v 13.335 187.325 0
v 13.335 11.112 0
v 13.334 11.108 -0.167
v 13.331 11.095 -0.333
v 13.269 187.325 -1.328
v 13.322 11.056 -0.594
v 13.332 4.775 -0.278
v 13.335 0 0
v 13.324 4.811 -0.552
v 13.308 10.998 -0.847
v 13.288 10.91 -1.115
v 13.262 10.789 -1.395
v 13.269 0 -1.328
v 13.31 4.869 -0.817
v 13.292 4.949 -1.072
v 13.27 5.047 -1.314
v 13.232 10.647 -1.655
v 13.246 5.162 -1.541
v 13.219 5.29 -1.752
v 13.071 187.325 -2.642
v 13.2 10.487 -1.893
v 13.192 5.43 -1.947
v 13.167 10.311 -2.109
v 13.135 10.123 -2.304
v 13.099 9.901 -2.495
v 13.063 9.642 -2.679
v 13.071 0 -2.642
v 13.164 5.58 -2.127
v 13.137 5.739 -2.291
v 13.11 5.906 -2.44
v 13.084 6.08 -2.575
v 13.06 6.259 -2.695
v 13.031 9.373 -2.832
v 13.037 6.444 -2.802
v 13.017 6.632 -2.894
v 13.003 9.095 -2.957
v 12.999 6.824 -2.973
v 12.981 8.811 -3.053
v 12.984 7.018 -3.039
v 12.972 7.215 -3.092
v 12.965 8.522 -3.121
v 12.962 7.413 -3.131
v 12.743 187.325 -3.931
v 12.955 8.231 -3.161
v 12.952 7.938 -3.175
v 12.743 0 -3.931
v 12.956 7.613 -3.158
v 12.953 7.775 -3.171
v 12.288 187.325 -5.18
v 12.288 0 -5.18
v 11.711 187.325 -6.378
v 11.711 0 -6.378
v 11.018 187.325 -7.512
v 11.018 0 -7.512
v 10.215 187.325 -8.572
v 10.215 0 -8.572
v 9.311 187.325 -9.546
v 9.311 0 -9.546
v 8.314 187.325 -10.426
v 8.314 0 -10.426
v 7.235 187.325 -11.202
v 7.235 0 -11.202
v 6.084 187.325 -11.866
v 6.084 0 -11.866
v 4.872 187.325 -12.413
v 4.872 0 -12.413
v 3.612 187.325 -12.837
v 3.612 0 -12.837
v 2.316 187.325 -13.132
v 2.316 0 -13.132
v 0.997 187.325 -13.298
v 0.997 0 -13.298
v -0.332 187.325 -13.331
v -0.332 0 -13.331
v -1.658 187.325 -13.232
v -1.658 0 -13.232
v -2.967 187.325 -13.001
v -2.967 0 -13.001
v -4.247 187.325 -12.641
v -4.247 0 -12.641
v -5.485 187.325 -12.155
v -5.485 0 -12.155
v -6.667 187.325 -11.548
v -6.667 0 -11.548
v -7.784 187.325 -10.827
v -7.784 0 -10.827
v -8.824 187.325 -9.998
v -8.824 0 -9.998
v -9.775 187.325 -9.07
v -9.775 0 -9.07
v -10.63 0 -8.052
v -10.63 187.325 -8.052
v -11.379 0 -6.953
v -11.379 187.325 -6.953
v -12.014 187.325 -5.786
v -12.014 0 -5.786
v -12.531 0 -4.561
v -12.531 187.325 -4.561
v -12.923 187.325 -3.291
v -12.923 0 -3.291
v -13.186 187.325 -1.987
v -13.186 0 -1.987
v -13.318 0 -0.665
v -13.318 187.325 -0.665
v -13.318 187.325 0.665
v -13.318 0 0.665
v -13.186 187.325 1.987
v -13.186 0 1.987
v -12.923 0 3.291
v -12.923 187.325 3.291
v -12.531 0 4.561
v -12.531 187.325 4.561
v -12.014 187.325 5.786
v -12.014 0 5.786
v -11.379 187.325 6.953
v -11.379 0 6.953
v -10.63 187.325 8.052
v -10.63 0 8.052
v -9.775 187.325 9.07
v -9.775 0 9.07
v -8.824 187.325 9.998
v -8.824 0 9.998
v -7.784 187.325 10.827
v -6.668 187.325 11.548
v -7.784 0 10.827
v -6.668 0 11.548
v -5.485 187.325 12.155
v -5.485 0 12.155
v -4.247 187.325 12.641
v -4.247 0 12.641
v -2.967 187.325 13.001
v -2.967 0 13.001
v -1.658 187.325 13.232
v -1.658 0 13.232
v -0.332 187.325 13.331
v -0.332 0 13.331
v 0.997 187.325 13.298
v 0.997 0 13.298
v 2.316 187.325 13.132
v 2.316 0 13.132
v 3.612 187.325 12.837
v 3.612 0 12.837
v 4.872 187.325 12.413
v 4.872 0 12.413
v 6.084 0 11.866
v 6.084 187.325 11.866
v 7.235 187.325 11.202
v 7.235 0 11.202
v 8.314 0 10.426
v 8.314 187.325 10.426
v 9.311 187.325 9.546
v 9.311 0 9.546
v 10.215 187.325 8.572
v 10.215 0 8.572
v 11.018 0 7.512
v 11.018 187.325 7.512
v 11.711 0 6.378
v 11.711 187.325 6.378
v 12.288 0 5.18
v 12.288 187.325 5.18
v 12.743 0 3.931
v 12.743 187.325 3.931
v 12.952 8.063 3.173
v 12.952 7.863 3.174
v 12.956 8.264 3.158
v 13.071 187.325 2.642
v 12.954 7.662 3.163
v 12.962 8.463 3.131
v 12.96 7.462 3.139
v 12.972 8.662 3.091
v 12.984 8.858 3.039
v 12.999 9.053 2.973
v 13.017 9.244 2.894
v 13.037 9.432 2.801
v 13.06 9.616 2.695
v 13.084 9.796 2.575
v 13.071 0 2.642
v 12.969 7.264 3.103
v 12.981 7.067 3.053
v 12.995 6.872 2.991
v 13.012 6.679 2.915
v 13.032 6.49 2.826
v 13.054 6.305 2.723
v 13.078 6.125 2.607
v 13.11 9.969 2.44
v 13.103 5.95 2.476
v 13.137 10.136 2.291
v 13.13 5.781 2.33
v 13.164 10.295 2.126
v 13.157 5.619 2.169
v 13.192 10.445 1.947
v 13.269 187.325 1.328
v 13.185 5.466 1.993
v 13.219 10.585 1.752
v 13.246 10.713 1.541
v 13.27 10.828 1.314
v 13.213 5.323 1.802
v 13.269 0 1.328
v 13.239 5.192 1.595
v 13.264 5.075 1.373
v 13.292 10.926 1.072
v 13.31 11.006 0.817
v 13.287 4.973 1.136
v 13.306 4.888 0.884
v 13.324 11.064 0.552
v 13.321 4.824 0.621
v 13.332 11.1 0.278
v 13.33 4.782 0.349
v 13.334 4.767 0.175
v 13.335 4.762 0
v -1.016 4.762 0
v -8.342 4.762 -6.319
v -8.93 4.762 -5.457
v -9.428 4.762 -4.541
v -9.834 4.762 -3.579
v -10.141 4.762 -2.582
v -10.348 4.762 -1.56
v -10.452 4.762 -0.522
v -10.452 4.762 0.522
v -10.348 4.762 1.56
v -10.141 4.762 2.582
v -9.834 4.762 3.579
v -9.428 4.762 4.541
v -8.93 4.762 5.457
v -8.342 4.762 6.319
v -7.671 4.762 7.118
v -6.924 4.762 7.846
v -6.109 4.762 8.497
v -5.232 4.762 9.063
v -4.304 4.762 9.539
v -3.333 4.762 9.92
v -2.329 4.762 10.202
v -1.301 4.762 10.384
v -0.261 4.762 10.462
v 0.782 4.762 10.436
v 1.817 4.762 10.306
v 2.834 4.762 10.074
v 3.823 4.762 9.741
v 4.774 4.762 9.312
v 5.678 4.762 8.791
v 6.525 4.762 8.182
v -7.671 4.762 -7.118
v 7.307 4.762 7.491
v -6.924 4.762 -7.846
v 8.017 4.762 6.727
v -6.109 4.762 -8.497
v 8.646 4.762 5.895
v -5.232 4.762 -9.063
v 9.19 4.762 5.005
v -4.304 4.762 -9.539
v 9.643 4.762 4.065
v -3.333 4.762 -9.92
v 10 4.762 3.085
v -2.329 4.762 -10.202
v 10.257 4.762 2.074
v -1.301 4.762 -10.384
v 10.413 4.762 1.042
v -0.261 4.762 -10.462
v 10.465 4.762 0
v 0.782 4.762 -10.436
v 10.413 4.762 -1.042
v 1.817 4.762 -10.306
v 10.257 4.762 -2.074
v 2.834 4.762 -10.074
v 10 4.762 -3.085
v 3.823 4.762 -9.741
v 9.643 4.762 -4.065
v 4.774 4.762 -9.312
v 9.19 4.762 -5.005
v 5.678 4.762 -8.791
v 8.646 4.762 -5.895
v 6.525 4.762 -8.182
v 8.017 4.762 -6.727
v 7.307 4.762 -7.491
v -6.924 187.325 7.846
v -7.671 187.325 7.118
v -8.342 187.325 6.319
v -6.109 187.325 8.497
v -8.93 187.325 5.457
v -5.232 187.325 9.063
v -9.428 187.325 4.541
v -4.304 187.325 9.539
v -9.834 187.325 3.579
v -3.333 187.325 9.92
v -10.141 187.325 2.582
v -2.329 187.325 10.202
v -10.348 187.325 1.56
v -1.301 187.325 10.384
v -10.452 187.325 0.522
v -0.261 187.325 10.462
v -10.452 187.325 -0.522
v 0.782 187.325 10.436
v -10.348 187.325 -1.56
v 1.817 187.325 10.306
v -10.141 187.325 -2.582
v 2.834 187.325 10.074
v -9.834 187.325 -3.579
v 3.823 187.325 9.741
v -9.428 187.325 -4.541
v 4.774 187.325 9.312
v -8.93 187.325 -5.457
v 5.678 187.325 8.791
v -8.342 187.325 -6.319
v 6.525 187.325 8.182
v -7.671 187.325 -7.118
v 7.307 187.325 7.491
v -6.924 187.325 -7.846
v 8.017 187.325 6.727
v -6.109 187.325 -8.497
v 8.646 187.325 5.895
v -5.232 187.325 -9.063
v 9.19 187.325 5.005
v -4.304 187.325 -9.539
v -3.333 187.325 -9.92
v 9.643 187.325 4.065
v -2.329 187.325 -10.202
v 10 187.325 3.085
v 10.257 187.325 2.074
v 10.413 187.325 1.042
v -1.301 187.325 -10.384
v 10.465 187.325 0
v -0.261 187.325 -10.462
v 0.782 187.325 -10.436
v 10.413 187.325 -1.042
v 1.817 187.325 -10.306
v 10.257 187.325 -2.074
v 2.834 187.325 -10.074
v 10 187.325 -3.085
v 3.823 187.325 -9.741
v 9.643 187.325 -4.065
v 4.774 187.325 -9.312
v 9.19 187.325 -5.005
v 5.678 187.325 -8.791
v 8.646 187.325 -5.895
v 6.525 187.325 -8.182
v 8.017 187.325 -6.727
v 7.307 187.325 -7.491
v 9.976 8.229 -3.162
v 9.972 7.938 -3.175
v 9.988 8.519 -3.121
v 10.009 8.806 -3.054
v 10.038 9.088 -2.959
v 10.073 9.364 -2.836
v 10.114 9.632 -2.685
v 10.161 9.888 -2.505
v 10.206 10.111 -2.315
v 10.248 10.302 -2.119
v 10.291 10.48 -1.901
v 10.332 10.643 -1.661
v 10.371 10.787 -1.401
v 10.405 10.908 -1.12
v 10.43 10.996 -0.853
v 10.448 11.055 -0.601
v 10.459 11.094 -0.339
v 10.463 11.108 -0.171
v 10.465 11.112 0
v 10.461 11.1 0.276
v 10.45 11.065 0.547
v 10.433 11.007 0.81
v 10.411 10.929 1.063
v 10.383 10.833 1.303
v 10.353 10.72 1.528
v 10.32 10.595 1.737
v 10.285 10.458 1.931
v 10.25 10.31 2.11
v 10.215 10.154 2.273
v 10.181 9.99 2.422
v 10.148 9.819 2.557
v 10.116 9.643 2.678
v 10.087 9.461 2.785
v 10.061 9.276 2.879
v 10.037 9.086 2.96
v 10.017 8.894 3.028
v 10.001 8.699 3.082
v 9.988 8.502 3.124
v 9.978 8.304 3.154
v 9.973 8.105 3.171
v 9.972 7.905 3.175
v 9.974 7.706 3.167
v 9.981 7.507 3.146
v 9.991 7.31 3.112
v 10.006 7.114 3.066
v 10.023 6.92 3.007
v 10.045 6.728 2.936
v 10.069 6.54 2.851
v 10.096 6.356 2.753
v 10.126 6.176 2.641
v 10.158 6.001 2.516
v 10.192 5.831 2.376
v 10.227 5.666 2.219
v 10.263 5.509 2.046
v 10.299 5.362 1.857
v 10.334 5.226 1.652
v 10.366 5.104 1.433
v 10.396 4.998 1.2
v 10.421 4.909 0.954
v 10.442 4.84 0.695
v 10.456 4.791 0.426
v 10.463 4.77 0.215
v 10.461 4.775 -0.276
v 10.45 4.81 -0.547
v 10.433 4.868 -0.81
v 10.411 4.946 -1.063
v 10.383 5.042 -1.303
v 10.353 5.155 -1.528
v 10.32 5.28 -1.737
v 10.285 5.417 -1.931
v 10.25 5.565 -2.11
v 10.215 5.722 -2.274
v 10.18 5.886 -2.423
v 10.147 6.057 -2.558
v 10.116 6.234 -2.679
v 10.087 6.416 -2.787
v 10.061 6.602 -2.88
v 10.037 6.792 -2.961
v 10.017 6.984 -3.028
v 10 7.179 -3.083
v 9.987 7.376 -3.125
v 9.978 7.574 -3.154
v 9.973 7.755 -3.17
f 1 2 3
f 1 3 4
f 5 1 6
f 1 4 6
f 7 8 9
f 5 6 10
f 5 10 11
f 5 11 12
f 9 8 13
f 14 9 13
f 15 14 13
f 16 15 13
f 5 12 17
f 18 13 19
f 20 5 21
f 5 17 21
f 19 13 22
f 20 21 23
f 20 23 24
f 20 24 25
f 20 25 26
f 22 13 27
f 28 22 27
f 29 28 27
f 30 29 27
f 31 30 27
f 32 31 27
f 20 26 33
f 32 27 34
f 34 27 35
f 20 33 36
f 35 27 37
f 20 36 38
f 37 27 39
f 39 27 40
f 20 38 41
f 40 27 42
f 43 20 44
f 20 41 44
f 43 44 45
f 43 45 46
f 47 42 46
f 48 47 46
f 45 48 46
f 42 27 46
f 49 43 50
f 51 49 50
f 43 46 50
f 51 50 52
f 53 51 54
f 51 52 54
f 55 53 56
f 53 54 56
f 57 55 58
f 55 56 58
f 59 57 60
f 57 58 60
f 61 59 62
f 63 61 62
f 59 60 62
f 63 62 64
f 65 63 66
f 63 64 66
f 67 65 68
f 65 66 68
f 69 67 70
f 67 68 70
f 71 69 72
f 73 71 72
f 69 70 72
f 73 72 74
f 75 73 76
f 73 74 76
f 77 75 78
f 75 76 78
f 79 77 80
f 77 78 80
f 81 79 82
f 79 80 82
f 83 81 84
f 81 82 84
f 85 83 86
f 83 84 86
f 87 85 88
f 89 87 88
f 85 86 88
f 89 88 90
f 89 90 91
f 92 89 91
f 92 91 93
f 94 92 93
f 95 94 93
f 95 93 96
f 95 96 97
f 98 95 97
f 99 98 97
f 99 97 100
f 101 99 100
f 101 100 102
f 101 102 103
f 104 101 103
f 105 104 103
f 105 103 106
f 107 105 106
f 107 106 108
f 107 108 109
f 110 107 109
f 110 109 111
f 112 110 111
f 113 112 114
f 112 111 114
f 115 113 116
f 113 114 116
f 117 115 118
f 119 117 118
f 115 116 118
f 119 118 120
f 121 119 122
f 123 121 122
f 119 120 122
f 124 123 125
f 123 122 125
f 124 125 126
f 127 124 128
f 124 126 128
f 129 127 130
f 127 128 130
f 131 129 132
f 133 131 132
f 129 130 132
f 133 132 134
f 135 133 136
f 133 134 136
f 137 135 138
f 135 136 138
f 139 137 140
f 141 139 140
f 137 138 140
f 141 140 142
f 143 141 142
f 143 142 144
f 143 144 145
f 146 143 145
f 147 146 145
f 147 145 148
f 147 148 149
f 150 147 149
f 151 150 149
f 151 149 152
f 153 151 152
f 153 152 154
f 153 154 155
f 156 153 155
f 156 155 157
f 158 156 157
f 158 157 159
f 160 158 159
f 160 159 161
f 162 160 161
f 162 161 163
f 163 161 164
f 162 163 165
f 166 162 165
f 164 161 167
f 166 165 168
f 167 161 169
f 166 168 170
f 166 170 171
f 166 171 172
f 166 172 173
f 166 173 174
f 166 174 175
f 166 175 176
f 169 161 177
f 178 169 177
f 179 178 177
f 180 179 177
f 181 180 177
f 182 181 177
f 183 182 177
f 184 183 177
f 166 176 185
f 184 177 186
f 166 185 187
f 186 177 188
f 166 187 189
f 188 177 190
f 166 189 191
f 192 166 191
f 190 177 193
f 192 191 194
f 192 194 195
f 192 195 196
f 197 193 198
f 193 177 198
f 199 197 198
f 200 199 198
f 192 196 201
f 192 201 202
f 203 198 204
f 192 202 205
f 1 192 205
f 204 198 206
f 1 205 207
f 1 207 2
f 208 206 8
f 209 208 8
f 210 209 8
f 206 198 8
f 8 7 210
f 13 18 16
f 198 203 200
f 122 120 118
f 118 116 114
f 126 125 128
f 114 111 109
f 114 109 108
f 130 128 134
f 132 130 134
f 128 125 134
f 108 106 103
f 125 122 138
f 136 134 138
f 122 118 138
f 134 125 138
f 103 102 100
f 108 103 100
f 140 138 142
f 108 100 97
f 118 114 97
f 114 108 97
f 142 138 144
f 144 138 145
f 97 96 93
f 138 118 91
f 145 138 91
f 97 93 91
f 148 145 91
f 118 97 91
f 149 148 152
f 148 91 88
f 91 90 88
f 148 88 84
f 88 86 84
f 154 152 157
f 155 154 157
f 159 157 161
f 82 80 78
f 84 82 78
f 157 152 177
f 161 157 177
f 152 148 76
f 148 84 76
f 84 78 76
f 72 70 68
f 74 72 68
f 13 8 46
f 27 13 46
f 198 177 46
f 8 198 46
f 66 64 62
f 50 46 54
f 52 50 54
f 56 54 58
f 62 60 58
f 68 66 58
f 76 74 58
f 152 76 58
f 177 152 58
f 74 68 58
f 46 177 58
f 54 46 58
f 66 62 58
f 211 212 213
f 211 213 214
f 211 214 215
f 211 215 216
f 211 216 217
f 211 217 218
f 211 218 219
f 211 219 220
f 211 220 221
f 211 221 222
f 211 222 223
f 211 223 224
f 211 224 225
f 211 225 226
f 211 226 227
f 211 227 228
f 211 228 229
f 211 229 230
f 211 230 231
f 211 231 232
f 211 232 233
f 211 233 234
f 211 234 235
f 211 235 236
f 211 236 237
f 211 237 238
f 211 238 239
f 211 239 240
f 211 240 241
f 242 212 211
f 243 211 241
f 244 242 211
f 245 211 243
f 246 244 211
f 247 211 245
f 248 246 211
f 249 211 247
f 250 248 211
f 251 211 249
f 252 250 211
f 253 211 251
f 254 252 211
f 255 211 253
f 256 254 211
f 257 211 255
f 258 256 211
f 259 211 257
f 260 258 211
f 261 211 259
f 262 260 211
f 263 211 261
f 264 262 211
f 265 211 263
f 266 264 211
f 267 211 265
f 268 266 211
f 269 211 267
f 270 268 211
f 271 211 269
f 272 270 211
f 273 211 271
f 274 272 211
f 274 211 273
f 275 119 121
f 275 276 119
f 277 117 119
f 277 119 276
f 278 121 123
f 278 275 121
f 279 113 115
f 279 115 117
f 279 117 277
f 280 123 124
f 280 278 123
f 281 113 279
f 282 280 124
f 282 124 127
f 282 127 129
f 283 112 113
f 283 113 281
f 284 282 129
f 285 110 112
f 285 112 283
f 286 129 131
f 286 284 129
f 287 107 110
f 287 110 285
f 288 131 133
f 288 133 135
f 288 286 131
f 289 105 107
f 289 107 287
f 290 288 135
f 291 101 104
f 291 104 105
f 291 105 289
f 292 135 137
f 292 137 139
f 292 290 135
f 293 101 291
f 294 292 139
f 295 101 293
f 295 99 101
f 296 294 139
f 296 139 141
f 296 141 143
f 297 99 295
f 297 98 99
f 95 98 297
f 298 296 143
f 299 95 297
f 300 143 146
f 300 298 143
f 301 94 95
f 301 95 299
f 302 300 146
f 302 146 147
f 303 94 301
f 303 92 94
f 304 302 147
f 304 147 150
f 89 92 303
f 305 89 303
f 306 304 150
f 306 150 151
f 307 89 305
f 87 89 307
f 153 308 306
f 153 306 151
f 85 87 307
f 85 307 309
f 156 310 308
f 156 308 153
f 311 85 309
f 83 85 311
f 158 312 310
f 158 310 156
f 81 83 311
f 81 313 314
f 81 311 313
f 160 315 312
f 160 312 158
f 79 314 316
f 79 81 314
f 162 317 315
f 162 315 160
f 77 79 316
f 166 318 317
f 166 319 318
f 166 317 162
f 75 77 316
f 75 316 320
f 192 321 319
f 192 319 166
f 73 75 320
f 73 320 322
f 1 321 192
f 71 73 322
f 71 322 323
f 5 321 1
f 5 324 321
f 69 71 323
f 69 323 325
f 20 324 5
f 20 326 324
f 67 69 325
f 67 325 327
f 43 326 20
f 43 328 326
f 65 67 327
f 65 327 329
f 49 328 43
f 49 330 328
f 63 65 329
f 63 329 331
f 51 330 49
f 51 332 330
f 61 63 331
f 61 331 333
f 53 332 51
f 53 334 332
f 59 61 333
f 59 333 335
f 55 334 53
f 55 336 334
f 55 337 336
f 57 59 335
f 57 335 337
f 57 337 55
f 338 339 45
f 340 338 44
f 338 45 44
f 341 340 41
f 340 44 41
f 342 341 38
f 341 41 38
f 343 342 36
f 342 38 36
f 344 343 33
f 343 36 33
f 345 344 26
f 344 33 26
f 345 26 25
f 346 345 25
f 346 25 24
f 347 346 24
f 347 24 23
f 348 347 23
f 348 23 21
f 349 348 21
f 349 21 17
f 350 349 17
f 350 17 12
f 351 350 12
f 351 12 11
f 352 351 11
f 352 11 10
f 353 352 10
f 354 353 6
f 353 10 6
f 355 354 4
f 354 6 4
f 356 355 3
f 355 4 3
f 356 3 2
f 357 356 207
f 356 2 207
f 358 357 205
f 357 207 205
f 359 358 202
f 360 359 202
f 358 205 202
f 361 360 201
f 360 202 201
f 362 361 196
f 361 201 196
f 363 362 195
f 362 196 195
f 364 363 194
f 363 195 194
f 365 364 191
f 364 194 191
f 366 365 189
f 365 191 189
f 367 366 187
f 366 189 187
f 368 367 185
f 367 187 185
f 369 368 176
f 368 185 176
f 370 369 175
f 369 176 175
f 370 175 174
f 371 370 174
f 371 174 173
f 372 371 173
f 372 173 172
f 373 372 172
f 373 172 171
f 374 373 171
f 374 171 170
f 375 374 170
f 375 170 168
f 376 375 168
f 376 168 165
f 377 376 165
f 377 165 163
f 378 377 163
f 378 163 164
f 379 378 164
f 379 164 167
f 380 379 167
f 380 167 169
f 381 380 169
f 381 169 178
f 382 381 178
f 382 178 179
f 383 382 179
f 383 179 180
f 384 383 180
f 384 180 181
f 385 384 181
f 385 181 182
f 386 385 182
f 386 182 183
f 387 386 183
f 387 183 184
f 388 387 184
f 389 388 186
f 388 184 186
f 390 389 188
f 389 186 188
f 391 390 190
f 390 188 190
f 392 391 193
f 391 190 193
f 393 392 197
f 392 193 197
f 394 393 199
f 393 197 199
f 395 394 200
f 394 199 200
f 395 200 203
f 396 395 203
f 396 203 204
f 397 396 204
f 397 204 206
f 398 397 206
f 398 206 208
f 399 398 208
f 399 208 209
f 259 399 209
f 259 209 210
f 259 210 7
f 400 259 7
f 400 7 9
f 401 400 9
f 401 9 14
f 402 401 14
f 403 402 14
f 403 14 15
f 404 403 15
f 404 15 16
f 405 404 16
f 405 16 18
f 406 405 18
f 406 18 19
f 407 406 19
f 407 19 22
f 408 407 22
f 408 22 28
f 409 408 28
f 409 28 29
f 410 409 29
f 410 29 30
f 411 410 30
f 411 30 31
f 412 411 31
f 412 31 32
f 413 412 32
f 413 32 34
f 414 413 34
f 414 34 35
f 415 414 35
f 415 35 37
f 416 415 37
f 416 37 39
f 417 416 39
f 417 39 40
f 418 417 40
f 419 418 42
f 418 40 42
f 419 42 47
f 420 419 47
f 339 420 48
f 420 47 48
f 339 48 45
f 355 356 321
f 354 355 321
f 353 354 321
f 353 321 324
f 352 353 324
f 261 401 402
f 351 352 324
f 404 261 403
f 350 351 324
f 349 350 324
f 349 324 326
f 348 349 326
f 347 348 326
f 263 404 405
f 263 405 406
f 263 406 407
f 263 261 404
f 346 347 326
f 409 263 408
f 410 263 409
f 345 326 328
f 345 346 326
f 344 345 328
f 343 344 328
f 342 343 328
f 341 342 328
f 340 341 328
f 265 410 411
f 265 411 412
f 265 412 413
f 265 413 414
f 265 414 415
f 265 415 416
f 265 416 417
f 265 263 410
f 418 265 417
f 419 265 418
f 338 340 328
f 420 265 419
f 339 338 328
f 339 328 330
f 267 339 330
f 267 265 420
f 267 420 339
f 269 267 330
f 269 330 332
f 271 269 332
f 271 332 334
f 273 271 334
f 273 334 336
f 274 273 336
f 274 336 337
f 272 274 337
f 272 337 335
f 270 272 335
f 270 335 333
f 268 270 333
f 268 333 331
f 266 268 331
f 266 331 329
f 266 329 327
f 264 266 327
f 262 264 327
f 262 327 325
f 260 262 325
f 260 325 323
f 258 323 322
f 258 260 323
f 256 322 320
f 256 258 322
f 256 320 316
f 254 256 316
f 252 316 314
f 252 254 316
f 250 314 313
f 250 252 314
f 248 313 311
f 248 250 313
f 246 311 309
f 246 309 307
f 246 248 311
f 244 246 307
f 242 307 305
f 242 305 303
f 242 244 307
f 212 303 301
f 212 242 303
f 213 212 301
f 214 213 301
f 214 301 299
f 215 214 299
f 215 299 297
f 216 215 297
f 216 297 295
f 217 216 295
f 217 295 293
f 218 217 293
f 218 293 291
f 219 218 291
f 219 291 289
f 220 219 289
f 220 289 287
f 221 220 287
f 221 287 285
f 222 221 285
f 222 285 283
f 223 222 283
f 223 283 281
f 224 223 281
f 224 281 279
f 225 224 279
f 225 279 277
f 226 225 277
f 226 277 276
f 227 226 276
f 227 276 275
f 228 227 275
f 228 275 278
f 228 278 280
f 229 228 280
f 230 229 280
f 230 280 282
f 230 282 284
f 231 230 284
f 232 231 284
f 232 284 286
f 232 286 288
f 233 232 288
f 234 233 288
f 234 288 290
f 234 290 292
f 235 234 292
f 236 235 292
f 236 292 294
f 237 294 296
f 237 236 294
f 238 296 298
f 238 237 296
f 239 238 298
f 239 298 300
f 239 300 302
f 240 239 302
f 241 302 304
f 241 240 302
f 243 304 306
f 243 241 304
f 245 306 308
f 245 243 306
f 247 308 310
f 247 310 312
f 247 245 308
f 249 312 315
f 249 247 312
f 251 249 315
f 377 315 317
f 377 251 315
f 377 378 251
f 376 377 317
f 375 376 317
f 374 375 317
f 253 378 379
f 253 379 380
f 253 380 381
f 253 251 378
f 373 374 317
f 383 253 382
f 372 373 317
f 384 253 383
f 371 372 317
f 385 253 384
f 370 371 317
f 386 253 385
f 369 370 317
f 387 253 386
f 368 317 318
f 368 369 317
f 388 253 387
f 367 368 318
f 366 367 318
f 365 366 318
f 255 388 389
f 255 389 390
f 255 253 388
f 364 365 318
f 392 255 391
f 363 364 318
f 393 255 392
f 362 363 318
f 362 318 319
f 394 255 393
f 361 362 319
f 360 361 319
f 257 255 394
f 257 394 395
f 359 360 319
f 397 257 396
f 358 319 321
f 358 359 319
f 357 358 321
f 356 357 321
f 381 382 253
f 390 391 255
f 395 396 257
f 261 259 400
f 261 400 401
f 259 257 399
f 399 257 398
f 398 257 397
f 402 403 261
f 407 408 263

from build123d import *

# Parameters (mm, degrees)
SKETCH1_R           = 13.335
SKETCH1_R_2         = 10.4648
BOSS_EXTRUDE1_DEPTH = 187.325
SKETCH1_2_R         = 10.4648
BOSS_EXTRUDE2_DEPTH = 4.7625
SKETCH3_R           = 3.175
CUT_EXTRUDE1_DEPTH  = 14.351


with BuildPart() as part:
    # Sketch1 → Boss-Extrude1 (new body)
    with BuildSketch(Plane(origin=(0, 0, 0), x_dir=(1, 0, 0), z_dir=(0, 1, 0))):
        Circle(SKETCH1_R)
        Circle(SKETCH1_R_2, mode=Mode.SUBTRACT)
    extrude(amount=BOSS_EXTRUDE1_DEPTH)

    # Sketch1<2> → Boss-Extrude2 (add)
    with BuildSketch(Plane(origin=(0, 0, 0), x_dir=(1, 0, 0), z_dir=(0, 1, 0))):
        Circle(SKETCH1_2_R)
    extrude(amount=BOSS_EXTRUDE2_DEPTH)

    # Sketch3 → Cut-Extrude1 (cut)
    with BuildSketch(Plane(origin=(13.335, 0, 0), x_dir=(0, 0, -1), z_dir=(1, 0, 0))):
        with Locations((0, 7.9375)):
            Circle(SKETCH3_R)
    extrude(amount=-CUT_EXTRUDE1_DEPTH, mode=Mode.SUBTRACT)


solid = part.part
